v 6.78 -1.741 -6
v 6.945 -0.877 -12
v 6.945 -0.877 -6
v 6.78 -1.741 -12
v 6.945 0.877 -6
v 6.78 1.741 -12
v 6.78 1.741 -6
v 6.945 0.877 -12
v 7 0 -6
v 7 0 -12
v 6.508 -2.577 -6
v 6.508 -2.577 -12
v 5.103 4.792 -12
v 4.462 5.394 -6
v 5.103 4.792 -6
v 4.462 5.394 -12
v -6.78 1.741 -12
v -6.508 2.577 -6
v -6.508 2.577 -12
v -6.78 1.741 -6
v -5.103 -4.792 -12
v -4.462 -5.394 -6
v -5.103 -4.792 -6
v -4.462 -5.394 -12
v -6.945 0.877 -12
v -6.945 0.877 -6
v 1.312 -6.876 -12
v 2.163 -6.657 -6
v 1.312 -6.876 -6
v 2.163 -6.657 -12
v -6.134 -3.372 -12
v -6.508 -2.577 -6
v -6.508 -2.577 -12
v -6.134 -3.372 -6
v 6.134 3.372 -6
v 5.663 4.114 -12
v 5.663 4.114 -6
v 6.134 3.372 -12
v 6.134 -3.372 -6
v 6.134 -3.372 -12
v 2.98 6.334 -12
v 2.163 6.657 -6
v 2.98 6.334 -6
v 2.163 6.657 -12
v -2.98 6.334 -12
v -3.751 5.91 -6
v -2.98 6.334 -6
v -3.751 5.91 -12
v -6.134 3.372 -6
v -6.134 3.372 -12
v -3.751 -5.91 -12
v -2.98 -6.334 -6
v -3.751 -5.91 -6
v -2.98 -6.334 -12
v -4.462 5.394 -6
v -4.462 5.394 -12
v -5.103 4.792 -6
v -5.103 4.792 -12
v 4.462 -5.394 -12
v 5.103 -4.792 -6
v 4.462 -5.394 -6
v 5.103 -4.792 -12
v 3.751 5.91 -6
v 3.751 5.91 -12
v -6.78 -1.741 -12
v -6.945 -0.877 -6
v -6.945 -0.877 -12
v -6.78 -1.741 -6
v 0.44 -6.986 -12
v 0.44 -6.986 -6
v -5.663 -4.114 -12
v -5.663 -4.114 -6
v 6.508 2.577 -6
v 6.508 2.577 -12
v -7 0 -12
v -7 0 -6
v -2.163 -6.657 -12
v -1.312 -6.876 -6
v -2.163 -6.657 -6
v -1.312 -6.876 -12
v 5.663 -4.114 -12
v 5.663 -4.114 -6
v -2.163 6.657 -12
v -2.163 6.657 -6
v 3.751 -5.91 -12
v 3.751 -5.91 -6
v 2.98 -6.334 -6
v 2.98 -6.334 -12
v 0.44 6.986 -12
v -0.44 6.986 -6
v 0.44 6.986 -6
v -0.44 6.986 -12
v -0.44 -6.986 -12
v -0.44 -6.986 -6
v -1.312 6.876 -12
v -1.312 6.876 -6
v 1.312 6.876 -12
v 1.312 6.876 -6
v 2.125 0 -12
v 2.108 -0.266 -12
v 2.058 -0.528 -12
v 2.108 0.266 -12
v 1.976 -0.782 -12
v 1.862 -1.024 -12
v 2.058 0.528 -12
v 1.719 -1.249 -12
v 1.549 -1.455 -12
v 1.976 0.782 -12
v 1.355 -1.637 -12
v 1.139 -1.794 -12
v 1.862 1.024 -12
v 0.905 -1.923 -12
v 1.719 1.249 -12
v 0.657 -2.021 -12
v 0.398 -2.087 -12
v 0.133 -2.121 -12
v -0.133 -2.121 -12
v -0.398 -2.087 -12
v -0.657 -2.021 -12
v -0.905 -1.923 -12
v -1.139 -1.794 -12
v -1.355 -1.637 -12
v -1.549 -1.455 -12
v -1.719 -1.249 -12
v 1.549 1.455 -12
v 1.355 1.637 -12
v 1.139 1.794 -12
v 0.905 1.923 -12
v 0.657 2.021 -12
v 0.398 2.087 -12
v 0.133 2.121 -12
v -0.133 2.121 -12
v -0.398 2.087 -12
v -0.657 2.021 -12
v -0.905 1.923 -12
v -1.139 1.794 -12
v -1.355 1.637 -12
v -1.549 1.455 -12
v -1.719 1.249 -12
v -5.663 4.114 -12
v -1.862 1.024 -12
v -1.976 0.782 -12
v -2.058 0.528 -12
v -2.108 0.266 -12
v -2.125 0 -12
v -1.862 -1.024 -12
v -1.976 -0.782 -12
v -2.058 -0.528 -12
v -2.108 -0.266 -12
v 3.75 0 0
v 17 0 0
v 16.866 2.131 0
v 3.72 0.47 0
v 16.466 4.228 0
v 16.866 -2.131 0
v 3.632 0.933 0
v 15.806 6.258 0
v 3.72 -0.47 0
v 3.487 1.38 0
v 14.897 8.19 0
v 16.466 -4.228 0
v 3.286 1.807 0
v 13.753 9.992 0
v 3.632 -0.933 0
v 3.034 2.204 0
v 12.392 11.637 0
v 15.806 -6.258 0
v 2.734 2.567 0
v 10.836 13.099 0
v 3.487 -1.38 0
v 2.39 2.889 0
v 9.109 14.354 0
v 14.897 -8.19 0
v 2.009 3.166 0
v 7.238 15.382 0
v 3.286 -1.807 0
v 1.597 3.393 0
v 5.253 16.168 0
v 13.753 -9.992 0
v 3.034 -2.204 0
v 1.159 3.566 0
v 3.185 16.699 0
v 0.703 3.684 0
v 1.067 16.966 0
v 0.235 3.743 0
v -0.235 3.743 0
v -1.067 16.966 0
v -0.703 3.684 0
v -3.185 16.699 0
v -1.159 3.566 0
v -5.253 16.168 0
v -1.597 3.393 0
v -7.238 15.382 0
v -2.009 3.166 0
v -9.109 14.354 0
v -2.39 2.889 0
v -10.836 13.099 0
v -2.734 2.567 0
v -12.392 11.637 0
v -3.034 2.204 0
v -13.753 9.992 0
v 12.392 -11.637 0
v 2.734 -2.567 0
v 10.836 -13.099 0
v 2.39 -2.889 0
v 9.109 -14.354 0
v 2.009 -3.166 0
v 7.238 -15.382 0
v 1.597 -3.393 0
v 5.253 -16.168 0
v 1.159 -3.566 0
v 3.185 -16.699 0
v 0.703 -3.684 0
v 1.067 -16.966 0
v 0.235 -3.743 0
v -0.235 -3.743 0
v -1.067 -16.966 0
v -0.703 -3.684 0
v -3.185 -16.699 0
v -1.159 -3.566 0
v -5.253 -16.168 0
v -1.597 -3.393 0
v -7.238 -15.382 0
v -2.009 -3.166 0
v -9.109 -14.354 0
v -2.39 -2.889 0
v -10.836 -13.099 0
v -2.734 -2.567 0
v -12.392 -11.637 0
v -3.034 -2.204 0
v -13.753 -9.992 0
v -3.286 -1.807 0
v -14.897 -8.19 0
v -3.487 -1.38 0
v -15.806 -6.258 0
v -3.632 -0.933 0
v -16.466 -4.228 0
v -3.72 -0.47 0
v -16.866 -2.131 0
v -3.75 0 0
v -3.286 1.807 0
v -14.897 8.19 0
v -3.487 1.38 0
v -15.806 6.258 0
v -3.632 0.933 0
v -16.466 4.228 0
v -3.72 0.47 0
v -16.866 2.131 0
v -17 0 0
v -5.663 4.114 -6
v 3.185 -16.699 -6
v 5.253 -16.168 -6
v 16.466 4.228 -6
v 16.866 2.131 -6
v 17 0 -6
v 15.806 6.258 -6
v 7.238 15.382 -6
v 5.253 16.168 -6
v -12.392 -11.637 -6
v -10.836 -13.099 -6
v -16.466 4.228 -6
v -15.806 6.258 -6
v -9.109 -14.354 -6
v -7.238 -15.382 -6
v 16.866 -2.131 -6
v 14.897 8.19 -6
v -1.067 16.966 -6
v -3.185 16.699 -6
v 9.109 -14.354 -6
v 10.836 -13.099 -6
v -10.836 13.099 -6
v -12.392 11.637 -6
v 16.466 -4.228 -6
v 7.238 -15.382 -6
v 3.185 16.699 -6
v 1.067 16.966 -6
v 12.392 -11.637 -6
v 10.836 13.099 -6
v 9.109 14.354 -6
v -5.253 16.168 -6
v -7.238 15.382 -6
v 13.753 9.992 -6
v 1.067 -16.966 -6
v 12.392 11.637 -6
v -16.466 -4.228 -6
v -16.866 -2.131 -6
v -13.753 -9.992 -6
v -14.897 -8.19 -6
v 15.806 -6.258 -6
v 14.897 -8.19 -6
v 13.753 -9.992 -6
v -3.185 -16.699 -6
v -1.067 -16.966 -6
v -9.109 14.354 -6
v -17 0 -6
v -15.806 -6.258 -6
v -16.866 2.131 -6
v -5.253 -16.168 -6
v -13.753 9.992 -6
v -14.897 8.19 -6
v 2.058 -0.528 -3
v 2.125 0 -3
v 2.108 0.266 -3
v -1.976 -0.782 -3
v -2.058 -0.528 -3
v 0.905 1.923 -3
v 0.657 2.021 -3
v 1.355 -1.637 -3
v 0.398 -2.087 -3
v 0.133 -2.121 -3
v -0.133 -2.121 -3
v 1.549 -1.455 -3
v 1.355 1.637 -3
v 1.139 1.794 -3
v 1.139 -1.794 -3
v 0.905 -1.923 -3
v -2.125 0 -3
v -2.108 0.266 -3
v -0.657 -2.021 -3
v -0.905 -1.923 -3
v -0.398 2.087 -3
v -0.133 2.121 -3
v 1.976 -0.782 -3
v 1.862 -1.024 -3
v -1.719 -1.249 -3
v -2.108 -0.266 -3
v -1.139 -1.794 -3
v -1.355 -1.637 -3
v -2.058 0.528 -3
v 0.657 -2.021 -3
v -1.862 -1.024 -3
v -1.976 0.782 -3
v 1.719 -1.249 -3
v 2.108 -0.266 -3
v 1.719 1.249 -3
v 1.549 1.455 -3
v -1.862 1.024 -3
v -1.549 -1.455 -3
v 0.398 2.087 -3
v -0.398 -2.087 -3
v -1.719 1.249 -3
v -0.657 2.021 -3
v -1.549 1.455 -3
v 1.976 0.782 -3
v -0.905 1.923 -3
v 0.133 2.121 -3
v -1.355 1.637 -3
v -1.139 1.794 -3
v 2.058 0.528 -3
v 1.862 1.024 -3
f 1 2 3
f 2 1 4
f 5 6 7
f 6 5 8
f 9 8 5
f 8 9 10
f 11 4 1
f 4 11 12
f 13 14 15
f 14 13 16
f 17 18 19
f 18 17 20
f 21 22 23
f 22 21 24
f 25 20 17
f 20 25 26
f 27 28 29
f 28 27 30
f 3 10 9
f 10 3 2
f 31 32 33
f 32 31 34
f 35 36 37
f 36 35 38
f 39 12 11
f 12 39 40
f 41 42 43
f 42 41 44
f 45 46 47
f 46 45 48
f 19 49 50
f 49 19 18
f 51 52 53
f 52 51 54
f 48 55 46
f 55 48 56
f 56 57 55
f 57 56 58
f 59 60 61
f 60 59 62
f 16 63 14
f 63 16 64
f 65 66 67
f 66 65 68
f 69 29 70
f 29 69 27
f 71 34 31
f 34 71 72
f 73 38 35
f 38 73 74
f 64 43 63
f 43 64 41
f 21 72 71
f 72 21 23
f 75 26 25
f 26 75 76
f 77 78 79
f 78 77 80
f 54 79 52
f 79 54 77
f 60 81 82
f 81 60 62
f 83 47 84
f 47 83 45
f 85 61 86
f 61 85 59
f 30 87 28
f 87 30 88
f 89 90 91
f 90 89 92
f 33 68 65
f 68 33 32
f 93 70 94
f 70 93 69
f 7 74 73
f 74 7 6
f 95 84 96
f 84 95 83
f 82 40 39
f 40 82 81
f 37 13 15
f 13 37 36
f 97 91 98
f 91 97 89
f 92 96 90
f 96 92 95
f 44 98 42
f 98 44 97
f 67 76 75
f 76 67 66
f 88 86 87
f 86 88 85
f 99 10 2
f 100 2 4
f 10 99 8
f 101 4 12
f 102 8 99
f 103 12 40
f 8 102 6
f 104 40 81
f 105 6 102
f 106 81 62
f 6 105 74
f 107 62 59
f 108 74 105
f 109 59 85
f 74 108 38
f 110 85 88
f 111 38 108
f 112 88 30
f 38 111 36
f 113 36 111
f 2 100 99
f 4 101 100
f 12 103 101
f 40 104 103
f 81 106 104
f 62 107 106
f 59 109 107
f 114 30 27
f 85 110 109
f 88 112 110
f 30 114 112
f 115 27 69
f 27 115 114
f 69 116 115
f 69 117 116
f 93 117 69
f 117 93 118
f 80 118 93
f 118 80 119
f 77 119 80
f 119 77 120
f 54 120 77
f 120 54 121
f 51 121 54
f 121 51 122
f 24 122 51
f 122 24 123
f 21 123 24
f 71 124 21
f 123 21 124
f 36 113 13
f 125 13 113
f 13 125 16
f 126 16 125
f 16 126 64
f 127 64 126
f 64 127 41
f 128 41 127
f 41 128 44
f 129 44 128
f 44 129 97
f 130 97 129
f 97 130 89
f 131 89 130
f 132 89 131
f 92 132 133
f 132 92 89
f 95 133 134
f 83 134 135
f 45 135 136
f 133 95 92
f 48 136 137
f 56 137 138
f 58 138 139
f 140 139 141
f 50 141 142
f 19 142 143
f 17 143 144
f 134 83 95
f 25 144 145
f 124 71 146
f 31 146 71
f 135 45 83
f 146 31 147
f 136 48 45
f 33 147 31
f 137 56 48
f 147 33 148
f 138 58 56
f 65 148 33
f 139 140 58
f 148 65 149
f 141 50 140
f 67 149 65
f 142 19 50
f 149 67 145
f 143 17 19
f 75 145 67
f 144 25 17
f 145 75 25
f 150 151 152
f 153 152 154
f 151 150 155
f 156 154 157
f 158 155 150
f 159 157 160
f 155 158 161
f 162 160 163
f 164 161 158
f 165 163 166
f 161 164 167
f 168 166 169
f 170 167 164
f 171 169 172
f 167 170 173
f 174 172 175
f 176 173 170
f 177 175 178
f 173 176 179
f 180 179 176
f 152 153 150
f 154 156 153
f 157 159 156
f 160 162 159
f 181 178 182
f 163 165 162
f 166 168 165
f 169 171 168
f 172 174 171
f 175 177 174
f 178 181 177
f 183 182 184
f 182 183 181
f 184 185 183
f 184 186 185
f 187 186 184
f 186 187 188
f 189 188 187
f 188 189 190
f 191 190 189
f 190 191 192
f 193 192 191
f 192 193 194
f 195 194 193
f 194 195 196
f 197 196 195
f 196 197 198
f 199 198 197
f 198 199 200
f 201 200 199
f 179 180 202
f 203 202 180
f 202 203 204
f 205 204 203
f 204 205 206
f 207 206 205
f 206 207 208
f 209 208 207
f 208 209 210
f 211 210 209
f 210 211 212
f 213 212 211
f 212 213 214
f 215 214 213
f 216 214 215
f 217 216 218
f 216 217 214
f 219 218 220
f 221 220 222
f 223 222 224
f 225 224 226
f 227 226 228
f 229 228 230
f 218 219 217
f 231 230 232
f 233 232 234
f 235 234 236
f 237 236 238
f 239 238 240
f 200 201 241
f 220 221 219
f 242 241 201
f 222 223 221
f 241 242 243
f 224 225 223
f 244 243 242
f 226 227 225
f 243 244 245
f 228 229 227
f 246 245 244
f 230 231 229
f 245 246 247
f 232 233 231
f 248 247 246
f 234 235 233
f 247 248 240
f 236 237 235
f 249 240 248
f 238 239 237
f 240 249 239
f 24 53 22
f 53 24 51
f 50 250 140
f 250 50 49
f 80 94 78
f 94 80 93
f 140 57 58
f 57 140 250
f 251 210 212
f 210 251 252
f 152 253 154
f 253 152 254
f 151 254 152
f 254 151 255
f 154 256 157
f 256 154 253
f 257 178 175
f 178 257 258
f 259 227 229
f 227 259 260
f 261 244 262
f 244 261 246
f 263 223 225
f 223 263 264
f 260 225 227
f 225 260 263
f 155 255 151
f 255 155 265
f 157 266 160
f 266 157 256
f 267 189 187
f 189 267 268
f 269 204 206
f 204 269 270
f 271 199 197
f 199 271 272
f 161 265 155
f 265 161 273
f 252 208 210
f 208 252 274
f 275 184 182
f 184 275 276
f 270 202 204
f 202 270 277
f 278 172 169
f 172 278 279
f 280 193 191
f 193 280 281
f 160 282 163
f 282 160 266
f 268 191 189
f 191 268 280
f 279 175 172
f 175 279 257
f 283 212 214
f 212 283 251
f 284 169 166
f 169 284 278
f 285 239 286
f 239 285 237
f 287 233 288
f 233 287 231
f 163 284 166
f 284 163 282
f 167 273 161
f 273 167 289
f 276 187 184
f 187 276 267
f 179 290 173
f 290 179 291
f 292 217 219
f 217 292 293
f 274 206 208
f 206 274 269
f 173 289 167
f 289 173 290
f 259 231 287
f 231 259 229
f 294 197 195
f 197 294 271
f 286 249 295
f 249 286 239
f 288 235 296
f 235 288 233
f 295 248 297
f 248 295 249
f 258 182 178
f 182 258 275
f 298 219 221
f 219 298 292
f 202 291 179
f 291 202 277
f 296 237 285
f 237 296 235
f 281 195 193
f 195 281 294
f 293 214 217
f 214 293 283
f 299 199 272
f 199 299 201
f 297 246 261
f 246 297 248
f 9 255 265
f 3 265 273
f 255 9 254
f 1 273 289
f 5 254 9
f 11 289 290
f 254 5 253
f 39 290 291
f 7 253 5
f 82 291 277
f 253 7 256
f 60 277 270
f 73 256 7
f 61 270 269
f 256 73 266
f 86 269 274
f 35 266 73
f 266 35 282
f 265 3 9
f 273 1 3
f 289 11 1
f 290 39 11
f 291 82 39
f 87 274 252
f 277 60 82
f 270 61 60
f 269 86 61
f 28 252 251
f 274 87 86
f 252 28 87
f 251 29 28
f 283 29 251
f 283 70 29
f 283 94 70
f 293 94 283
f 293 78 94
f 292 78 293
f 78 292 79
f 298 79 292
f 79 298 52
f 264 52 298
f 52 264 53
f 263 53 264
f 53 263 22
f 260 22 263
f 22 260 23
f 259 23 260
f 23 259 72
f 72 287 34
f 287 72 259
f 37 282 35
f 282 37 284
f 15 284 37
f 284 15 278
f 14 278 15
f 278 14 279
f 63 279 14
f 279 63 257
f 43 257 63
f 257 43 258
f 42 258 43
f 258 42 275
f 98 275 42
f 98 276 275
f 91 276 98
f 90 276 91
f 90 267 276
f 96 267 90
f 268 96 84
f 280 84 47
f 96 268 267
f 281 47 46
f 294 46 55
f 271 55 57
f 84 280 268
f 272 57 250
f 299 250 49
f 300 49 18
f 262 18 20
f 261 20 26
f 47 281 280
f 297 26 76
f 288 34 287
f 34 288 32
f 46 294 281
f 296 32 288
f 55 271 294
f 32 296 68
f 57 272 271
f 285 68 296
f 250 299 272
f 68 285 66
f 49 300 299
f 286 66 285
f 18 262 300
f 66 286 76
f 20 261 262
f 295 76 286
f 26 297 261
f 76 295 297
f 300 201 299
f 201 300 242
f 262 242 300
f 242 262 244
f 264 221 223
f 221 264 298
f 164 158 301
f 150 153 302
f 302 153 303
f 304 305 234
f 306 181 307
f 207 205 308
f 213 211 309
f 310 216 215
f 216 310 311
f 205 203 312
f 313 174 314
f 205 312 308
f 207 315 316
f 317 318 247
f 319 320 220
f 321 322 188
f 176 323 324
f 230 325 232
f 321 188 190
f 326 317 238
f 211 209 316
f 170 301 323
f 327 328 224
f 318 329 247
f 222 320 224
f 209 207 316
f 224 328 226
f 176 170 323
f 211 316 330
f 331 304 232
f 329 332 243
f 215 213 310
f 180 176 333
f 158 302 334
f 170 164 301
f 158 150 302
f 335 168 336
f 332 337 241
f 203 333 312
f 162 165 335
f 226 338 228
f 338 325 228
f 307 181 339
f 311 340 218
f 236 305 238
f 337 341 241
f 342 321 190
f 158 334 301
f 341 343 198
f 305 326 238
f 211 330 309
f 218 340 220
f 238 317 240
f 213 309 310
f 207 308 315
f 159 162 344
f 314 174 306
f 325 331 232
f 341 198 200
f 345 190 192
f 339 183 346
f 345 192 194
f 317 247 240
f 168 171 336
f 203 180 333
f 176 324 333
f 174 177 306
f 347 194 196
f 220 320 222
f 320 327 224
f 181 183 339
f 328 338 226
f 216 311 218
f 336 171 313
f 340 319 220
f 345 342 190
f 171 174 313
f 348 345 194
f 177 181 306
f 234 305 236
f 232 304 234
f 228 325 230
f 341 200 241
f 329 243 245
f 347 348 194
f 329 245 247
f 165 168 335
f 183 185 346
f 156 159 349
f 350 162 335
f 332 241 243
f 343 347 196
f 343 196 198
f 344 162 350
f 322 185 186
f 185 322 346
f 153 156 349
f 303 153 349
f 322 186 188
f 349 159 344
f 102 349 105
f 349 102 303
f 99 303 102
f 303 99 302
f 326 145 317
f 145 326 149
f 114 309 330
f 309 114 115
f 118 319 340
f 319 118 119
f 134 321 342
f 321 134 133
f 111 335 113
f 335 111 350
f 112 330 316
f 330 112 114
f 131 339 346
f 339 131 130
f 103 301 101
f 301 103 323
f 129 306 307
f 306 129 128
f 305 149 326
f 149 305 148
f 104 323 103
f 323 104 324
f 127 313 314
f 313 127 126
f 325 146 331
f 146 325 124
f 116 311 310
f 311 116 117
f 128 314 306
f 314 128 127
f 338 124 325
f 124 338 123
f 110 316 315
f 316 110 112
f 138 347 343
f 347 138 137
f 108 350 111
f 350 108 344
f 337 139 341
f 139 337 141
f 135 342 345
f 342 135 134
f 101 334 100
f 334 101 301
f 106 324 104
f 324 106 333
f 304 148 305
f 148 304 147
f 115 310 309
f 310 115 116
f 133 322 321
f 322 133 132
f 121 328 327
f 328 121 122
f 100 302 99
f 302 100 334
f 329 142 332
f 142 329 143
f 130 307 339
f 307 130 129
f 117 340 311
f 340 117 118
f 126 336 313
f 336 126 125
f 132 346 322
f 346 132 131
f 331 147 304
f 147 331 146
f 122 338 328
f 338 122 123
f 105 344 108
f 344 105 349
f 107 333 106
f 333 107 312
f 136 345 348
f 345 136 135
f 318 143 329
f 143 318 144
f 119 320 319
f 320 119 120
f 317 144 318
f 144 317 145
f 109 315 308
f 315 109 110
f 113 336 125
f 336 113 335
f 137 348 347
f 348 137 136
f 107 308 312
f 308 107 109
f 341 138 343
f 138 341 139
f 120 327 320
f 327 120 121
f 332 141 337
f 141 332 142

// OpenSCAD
$fn = 50;


difference() {
	union() {
		translate(v = [0, 0, -12.0000000000]) {
			cylinder(h = 12, r = 7.0000000000);
		}
		translate(v = [0, 0, -6.0000000000]) {
			cylinder(h = 6, r = 17.0000000000);
		}
	}
	union() {
		translate(v = [0, 0, 0]) {
			rotate(a = [0, 0, 0]) {
				difference() {
					union() {
						#translate(v = [0, 0, -12.0000000000]) {
							cylinder(h = 12, r = 2.0000000000);
						}
						#translate(v = [0, 0, -3]) {
							cylinder(h = 3, r = 7.0000000000, r1 = 2.1250000000, r2 = 3.7500000000);
						}
						#translate(v = [0, 0, -12.0000000000]) {
							cylinder(h = 12, r = 2.1250000000);
						}
						#translate(v = [0, 0, -12.0000000000]) {
							cylinder(h = 12, r = 2.0000000000);
						}
					}
					union();
				}
			}
		}
	}
}
